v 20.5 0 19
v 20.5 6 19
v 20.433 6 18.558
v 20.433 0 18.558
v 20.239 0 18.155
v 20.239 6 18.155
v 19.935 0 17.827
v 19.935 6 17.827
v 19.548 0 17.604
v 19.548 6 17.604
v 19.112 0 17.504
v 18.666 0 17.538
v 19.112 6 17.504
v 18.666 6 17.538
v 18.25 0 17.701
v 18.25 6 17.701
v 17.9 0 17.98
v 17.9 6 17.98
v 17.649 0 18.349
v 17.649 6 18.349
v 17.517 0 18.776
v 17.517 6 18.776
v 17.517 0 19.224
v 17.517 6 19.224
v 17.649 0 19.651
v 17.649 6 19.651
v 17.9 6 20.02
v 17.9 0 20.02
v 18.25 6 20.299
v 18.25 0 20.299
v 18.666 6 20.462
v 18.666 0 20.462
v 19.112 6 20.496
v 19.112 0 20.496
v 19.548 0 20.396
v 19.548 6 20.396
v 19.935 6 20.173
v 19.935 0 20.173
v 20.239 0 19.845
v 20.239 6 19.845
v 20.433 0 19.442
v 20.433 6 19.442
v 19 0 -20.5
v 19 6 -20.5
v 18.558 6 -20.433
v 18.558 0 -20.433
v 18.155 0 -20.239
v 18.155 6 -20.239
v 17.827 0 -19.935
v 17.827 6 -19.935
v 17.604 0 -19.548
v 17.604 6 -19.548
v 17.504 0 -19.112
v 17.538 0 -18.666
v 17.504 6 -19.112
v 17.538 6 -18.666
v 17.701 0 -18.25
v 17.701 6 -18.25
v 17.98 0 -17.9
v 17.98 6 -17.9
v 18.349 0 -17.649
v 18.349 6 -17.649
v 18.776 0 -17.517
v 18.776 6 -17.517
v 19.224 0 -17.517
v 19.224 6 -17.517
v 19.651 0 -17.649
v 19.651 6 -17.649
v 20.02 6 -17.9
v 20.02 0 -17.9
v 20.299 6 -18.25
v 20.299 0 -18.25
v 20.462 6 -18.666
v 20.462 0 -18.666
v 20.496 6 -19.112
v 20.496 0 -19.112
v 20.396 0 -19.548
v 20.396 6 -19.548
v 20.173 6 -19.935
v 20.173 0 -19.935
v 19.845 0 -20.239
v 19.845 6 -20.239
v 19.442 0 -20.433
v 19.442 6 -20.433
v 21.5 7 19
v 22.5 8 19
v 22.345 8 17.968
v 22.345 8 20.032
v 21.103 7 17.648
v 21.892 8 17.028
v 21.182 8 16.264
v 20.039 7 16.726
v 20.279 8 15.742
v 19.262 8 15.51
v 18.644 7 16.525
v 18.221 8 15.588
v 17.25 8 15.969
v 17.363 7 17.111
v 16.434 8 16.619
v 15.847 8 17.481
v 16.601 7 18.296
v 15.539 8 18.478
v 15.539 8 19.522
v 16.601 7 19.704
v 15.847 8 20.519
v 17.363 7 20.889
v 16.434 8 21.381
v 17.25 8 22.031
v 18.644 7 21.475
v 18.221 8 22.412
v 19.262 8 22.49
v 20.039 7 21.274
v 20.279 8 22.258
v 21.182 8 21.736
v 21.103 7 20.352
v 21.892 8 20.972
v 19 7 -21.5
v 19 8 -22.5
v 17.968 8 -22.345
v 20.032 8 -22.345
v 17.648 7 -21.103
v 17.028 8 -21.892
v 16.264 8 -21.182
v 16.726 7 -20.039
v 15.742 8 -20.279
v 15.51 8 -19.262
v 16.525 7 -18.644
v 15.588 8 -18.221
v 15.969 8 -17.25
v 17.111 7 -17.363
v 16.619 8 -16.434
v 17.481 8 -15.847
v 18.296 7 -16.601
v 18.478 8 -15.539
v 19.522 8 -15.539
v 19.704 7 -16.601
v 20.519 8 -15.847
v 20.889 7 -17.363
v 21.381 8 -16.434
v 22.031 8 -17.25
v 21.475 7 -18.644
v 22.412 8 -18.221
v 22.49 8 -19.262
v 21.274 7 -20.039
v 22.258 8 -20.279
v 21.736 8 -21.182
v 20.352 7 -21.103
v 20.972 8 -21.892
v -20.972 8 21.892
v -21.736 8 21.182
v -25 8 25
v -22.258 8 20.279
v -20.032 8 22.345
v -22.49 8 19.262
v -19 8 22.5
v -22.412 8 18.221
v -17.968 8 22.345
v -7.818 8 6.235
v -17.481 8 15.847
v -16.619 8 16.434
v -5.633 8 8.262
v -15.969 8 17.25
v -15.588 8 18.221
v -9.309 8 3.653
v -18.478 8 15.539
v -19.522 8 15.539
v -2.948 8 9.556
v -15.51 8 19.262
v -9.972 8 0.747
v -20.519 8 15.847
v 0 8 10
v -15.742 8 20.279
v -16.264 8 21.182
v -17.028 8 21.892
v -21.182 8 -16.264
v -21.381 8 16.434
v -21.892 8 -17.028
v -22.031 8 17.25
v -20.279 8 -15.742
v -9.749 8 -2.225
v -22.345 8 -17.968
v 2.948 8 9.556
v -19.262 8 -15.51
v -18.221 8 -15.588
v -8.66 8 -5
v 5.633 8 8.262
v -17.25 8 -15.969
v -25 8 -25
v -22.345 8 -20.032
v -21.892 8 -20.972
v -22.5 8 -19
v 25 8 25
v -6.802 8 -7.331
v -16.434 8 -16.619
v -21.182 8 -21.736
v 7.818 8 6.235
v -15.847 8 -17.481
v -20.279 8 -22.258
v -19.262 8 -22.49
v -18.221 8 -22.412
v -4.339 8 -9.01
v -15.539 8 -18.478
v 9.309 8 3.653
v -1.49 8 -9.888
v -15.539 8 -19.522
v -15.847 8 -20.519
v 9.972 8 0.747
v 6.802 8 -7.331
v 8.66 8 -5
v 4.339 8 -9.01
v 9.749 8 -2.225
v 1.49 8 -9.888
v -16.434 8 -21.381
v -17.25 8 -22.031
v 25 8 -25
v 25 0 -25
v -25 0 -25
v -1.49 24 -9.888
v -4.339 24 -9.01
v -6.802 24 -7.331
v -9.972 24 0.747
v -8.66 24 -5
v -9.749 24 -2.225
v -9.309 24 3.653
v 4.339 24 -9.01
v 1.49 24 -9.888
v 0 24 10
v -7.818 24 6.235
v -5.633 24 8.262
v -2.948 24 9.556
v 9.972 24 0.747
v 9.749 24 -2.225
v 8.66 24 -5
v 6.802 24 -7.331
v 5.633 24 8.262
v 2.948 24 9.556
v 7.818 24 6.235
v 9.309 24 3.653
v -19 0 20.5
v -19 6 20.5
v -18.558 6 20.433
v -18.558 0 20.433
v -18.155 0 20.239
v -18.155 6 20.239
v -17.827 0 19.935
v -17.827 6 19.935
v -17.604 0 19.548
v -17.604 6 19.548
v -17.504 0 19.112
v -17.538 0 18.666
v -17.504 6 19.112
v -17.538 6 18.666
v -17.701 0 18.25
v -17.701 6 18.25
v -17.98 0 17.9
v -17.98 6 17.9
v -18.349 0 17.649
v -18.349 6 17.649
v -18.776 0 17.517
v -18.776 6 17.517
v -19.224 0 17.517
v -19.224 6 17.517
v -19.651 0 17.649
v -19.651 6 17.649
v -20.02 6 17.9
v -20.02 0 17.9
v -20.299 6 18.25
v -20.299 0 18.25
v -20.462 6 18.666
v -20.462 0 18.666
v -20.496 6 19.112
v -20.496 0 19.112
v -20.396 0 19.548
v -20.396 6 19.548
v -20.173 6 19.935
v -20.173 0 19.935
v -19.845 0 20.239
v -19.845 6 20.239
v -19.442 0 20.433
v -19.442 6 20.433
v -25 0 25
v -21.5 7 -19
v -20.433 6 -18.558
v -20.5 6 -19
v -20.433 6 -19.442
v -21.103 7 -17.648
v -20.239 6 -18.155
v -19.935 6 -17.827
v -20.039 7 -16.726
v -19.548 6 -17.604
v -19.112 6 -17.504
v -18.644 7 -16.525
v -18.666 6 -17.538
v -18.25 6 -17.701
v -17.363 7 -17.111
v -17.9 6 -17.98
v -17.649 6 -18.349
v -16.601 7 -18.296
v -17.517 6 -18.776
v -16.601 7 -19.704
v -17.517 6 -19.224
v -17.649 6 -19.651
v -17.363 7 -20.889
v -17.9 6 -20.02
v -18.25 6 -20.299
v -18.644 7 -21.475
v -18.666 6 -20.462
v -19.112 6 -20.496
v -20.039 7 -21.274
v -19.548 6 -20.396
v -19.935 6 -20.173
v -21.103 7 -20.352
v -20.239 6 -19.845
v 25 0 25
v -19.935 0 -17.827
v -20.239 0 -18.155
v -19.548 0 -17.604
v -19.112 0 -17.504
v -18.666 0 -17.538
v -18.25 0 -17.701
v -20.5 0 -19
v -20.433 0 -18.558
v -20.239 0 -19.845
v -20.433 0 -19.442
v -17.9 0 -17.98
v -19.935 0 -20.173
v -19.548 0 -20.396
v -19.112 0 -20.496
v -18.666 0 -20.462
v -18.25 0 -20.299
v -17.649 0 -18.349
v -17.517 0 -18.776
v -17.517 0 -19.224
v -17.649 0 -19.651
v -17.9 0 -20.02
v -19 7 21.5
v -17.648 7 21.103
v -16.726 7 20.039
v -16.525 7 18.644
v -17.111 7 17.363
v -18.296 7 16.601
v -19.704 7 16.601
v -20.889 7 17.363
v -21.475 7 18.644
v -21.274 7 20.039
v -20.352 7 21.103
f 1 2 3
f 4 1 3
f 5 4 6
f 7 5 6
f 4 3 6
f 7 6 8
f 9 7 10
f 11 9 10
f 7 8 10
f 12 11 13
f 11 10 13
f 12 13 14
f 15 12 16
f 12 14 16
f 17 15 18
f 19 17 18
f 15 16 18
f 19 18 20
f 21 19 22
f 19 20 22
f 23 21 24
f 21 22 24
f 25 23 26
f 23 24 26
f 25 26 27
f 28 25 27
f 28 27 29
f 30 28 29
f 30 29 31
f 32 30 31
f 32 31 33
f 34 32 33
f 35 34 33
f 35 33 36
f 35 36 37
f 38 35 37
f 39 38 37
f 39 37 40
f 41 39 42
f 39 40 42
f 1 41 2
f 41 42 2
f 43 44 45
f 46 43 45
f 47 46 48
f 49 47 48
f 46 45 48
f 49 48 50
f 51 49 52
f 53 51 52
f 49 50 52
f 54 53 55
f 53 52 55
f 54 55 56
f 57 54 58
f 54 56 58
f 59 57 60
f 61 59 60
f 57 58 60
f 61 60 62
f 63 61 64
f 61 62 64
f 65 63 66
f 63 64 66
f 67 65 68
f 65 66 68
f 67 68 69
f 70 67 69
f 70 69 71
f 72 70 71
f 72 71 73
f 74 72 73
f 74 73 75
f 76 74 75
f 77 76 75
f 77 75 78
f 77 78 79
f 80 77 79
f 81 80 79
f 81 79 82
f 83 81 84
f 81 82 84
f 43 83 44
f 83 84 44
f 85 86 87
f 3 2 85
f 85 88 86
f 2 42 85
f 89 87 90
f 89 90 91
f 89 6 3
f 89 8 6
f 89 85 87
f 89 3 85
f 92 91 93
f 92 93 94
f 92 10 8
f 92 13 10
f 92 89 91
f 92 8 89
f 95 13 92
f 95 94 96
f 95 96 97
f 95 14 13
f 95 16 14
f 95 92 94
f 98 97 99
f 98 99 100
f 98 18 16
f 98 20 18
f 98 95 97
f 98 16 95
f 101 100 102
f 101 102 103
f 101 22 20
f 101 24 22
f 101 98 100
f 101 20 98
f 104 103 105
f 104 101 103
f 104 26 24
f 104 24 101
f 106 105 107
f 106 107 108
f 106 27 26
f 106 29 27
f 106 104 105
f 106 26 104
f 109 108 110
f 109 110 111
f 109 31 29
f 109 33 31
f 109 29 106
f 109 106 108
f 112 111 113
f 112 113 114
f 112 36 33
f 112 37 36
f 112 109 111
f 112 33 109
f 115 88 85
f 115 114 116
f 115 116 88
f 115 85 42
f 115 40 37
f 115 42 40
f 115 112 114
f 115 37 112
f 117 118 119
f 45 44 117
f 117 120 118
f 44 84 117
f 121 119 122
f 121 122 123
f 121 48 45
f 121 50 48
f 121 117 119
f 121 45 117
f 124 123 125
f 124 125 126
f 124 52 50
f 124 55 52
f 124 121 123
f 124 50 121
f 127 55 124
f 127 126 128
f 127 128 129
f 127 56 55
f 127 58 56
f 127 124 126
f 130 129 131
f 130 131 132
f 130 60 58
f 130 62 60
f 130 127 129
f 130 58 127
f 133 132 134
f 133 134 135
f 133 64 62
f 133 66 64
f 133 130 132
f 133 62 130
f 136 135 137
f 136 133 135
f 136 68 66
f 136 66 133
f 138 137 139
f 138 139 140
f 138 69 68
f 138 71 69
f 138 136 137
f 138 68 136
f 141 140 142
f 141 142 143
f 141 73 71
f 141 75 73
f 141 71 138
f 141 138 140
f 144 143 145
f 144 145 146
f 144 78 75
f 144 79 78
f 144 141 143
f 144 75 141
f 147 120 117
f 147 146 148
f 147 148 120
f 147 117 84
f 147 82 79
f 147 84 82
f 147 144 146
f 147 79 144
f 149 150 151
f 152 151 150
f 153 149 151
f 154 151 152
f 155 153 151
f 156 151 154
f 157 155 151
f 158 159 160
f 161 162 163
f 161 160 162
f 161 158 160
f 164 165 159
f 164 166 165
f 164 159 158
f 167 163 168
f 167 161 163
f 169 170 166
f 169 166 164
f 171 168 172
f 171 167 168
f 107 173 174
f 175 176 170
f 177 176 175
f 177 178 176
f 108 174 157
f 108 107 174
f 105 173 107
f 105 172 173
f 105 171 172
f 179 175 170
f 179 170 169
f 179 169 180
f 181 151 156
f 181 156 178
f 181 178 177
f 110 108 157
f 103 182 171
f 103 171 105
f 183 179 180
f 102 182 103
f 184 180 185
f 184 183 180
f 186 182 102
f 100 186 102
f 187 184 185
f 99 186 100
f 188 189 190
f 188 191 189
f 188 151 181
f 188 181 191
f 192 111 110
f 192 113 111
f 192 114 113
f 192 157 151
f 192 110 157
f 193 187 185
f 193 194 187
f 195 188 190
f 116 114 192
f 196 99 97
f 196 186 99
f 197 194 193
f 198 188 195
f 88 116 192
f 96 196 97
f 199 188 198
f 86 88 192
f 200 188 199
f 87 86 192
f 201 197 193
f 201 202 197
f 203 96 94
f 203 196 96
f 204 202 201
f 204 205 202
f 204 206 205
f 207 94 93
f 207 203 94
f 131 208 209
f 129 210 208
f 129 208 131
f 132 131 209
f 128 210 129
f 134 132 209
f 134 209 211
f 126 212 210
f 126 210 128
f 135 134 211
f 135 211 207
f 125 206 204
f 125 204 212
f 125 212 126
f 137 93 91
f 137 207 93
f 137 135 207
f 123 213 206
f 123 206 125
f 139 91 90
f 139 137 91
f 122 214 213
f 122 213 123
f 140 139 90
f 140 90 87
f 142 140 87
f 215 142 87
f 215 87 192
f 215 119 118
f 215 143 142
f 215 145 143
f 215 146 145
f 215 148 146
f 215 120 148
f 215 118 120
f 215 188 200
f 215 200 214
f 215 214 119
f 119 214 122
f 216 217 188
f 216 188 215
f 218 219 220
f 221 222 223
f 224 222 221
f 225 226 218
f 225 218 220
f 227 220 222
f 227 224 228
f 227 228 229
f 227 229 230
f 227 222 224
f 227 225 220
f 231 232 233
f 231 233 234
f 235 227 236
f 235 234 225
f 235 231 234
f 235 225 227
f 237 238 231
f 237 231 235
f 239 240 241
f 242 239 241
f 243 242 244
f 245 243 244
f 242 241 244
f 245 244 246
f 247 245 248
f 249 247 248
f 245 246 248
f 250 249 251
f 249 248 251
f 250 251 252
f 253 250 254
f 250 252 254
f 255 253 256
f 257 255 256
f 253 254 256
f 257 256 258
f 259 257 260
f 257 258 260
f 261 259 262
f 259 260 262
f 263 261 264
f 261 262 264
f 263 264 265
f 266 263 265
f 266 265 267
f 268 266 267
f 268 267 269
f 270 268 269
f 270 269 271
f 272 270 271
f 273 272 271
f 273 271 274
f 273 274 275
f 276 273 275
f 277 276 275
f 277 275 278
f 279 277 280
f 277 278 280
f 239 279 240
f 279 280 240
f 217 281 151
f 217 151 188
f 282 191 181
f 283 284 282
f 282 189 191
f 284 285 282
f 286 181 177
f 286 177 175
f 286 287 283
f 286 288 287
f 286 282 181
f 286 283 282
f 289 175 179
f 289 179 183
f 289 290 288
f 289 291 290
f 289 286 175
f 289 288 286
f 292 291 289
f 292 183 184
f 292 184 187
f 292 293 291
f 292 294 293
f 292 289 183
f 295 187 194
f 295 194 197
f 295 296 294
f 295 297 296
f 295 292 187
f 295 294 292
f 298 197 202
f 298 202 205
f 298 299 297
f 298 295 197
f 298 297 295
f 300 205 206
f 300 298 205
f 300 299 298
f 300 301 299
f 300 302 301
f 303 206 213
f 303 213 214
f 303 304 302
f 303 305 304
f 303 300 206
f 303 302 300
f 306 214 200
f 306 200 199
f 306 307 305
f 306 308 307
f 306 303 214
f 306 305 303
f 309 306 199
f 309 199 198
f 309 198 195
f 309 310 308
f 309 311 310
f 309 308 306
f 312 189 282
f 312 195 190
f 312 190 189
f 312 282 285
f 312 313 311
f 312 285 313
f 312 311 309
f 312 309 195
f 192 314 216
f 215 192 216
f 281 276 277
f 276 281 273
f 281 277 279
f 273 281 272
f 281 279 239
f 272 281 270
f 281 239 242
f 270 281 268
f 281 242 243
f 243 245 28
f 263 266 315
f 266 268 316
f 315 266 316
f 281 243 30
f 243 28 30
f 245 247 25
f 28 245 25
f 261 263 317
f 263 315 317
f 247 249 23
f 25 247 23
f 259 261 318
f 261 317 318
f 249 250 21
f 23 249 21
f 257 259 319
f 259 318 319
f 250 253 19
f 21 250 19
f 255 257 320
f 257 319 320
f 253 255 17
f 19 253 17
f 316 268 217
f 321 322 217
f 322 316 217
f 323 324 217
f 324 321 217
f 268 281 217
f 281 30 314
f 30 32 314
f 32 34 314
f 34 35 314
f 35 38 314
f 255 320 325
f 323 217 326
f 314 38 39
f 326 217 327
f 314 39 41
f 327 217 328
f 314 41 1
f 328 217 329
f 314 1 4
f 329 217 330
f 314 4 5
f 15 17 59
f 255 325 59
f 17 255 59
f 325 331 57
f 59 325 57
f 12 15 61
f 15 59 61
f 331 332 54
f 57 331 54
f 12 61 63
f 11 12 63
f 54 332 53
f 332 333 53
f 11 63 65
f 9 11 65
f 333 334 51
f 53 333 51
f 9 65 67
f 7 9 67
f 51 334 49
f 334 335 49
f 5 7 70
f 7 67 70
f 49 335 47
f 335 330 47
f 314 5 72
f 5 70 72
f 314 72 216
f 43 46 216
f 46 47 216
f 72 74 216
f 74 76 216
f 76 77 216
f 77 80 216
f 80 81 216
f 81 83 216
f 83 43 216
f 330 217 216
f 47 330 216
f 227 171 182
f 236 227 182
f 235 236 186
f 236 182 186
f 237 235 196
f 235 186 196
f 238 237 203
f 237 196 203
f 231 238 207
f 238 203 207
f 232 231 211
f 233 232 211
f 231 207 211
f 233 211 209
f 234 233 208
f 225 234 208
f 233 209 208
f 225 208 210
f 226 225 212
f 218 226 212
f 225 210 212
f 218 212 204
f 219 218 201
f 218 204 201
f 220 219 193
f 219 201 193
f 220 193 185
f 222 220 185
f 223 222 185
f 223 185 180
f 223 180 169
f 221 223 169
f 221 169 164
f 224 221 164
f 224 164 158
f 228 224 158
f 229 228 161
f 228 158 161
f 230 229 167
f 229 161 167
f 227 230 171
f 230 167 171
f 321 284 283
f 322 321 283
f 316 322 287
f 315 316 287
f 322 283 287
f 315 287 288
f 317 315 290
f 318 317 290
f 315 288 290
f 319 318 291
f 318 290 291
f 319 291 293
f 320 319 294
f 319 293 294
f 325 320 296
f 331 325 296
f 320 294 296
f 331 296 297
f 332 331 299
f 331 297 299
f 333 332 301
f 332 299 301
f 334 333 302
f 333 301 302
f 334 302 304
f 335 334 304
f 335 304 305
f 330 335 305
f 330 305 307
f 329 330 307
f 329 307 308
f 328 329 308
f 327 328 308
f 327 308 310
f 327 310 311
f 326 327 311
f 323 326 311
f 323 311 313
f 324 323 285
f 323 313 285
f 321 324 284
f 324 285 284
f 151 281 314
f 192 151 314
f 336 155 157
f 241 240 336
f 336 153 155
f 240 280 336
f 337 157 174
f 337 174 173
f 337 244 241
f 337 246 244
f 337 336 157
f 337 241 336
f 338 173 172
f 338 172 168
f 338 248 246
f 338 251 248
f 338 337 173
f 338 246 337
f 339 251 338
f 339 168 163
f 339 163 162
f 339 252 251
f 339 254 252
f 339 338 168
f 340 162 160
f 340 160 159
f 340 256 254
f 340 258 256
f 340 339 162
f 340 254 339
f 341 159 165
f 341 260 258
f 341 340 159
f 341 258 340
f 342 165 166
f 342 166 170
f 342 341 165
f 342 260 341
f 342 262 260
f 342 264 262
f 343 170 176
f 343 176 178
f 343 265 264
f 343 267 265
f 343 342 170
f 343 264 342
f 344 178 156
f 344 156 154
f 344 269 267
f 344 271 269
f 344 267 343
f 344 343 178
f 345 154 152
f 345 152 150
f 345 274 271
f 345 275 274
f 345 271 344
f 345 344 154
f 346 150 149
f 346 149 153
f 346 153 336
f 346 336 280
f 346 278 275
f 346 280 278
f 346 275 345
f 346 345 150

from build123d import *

# Parameters (mm, degrees)
SKETCH1_W                    = 50
SKETCH1_H                    = 50
BOSS_EXTRUDE1_DEPTH          = 8
SKETCH2_R                    = 10
BOSS_EXTRUDE2_DEPTH          = 16
SKETCH3_R                    = 1.5
CUT_EXTRUDE1_DEPTH           = 8
CHAMFER1_SIZE                = 2
CIRPATTERN3_COUNT            = 4
CHAMFER1_OF_CIRPATTERN3_SIZE = 2


with BuildPart() as part:
    # Sketch1 → Boss-Extrude1 (new body)
    with BuildSketch(Plane(origin=(0, 0, 0), x_dir=(1, 0, 0), z_dir=(0, 1, 0))):
        Rectangle(SKETCH1_W, SKETCH1_H)
    extrude(amount=BOSS_EXTRUDE1_DEPTH)

    # Sketch2 → Boss-Extrude2 (add)
    with BuildSketch(Plane(origin=(0, 8, 0), x_dir=(1, 0, 0), z_dir=(0, 1, 0))):
        with Locations(Location((0, 0, 0), (0, 0, 270))):
            Circle(SKETCH2_R)
    extrude(amount=BOSS_EXTRUDE2_DEPTH)

    # Sketch3 → Cut-Extrude1 (cut)
    with BuildSketch(Plane(origin=(0, 8, 0), x_dir=(1, 0, 0), z_dir=(0, 1, 0))):
        with Locations(Location((-19, -19, 0), (0, 0, 270))):
            Circle(SKETCH3_R)
    cut_extrude1 = extrude(amount=-CUT_EXTRUDE1_DEPTH, mode=Mode.SUBTRACT)

    # Chamfer1
    chamfer1_edges = [part.edges().sort_by_distance(p)[0] for p in [
        (-19, 8, 17.5),
    ]]
    chamfer(chamfer1_edges, length=CHAMFER1_SIZE)

    # CirPattern3: Cut-Extrude1 ×4 about axis
    cirpattern3_axis = Axis((0, 0, 0), (0, 1, 0))
    for i in range(1, CIRPATTERN3_COUNT):
        add(cut_extrude1.rotate(cirpattern3_axis, i * 360 / CIRPATTERN3_COUNT), mode=Mode.SUBTRACT)

    # Chamfer1 of CirPattern3
    chamfer1_of_cirpattern3_edges = [part.edges().sort_by_distance(p)[0] for p in [
        (17.5, 8, 19),
        (19, 8, -17.5),
        (-17.5, 8, -19),
    ]]
    chamfer(chamfer1_of_cirpattern3_edges, length=CHAMFER1_OF_CIRPATTERN3_SIZE)


solid = part.part
